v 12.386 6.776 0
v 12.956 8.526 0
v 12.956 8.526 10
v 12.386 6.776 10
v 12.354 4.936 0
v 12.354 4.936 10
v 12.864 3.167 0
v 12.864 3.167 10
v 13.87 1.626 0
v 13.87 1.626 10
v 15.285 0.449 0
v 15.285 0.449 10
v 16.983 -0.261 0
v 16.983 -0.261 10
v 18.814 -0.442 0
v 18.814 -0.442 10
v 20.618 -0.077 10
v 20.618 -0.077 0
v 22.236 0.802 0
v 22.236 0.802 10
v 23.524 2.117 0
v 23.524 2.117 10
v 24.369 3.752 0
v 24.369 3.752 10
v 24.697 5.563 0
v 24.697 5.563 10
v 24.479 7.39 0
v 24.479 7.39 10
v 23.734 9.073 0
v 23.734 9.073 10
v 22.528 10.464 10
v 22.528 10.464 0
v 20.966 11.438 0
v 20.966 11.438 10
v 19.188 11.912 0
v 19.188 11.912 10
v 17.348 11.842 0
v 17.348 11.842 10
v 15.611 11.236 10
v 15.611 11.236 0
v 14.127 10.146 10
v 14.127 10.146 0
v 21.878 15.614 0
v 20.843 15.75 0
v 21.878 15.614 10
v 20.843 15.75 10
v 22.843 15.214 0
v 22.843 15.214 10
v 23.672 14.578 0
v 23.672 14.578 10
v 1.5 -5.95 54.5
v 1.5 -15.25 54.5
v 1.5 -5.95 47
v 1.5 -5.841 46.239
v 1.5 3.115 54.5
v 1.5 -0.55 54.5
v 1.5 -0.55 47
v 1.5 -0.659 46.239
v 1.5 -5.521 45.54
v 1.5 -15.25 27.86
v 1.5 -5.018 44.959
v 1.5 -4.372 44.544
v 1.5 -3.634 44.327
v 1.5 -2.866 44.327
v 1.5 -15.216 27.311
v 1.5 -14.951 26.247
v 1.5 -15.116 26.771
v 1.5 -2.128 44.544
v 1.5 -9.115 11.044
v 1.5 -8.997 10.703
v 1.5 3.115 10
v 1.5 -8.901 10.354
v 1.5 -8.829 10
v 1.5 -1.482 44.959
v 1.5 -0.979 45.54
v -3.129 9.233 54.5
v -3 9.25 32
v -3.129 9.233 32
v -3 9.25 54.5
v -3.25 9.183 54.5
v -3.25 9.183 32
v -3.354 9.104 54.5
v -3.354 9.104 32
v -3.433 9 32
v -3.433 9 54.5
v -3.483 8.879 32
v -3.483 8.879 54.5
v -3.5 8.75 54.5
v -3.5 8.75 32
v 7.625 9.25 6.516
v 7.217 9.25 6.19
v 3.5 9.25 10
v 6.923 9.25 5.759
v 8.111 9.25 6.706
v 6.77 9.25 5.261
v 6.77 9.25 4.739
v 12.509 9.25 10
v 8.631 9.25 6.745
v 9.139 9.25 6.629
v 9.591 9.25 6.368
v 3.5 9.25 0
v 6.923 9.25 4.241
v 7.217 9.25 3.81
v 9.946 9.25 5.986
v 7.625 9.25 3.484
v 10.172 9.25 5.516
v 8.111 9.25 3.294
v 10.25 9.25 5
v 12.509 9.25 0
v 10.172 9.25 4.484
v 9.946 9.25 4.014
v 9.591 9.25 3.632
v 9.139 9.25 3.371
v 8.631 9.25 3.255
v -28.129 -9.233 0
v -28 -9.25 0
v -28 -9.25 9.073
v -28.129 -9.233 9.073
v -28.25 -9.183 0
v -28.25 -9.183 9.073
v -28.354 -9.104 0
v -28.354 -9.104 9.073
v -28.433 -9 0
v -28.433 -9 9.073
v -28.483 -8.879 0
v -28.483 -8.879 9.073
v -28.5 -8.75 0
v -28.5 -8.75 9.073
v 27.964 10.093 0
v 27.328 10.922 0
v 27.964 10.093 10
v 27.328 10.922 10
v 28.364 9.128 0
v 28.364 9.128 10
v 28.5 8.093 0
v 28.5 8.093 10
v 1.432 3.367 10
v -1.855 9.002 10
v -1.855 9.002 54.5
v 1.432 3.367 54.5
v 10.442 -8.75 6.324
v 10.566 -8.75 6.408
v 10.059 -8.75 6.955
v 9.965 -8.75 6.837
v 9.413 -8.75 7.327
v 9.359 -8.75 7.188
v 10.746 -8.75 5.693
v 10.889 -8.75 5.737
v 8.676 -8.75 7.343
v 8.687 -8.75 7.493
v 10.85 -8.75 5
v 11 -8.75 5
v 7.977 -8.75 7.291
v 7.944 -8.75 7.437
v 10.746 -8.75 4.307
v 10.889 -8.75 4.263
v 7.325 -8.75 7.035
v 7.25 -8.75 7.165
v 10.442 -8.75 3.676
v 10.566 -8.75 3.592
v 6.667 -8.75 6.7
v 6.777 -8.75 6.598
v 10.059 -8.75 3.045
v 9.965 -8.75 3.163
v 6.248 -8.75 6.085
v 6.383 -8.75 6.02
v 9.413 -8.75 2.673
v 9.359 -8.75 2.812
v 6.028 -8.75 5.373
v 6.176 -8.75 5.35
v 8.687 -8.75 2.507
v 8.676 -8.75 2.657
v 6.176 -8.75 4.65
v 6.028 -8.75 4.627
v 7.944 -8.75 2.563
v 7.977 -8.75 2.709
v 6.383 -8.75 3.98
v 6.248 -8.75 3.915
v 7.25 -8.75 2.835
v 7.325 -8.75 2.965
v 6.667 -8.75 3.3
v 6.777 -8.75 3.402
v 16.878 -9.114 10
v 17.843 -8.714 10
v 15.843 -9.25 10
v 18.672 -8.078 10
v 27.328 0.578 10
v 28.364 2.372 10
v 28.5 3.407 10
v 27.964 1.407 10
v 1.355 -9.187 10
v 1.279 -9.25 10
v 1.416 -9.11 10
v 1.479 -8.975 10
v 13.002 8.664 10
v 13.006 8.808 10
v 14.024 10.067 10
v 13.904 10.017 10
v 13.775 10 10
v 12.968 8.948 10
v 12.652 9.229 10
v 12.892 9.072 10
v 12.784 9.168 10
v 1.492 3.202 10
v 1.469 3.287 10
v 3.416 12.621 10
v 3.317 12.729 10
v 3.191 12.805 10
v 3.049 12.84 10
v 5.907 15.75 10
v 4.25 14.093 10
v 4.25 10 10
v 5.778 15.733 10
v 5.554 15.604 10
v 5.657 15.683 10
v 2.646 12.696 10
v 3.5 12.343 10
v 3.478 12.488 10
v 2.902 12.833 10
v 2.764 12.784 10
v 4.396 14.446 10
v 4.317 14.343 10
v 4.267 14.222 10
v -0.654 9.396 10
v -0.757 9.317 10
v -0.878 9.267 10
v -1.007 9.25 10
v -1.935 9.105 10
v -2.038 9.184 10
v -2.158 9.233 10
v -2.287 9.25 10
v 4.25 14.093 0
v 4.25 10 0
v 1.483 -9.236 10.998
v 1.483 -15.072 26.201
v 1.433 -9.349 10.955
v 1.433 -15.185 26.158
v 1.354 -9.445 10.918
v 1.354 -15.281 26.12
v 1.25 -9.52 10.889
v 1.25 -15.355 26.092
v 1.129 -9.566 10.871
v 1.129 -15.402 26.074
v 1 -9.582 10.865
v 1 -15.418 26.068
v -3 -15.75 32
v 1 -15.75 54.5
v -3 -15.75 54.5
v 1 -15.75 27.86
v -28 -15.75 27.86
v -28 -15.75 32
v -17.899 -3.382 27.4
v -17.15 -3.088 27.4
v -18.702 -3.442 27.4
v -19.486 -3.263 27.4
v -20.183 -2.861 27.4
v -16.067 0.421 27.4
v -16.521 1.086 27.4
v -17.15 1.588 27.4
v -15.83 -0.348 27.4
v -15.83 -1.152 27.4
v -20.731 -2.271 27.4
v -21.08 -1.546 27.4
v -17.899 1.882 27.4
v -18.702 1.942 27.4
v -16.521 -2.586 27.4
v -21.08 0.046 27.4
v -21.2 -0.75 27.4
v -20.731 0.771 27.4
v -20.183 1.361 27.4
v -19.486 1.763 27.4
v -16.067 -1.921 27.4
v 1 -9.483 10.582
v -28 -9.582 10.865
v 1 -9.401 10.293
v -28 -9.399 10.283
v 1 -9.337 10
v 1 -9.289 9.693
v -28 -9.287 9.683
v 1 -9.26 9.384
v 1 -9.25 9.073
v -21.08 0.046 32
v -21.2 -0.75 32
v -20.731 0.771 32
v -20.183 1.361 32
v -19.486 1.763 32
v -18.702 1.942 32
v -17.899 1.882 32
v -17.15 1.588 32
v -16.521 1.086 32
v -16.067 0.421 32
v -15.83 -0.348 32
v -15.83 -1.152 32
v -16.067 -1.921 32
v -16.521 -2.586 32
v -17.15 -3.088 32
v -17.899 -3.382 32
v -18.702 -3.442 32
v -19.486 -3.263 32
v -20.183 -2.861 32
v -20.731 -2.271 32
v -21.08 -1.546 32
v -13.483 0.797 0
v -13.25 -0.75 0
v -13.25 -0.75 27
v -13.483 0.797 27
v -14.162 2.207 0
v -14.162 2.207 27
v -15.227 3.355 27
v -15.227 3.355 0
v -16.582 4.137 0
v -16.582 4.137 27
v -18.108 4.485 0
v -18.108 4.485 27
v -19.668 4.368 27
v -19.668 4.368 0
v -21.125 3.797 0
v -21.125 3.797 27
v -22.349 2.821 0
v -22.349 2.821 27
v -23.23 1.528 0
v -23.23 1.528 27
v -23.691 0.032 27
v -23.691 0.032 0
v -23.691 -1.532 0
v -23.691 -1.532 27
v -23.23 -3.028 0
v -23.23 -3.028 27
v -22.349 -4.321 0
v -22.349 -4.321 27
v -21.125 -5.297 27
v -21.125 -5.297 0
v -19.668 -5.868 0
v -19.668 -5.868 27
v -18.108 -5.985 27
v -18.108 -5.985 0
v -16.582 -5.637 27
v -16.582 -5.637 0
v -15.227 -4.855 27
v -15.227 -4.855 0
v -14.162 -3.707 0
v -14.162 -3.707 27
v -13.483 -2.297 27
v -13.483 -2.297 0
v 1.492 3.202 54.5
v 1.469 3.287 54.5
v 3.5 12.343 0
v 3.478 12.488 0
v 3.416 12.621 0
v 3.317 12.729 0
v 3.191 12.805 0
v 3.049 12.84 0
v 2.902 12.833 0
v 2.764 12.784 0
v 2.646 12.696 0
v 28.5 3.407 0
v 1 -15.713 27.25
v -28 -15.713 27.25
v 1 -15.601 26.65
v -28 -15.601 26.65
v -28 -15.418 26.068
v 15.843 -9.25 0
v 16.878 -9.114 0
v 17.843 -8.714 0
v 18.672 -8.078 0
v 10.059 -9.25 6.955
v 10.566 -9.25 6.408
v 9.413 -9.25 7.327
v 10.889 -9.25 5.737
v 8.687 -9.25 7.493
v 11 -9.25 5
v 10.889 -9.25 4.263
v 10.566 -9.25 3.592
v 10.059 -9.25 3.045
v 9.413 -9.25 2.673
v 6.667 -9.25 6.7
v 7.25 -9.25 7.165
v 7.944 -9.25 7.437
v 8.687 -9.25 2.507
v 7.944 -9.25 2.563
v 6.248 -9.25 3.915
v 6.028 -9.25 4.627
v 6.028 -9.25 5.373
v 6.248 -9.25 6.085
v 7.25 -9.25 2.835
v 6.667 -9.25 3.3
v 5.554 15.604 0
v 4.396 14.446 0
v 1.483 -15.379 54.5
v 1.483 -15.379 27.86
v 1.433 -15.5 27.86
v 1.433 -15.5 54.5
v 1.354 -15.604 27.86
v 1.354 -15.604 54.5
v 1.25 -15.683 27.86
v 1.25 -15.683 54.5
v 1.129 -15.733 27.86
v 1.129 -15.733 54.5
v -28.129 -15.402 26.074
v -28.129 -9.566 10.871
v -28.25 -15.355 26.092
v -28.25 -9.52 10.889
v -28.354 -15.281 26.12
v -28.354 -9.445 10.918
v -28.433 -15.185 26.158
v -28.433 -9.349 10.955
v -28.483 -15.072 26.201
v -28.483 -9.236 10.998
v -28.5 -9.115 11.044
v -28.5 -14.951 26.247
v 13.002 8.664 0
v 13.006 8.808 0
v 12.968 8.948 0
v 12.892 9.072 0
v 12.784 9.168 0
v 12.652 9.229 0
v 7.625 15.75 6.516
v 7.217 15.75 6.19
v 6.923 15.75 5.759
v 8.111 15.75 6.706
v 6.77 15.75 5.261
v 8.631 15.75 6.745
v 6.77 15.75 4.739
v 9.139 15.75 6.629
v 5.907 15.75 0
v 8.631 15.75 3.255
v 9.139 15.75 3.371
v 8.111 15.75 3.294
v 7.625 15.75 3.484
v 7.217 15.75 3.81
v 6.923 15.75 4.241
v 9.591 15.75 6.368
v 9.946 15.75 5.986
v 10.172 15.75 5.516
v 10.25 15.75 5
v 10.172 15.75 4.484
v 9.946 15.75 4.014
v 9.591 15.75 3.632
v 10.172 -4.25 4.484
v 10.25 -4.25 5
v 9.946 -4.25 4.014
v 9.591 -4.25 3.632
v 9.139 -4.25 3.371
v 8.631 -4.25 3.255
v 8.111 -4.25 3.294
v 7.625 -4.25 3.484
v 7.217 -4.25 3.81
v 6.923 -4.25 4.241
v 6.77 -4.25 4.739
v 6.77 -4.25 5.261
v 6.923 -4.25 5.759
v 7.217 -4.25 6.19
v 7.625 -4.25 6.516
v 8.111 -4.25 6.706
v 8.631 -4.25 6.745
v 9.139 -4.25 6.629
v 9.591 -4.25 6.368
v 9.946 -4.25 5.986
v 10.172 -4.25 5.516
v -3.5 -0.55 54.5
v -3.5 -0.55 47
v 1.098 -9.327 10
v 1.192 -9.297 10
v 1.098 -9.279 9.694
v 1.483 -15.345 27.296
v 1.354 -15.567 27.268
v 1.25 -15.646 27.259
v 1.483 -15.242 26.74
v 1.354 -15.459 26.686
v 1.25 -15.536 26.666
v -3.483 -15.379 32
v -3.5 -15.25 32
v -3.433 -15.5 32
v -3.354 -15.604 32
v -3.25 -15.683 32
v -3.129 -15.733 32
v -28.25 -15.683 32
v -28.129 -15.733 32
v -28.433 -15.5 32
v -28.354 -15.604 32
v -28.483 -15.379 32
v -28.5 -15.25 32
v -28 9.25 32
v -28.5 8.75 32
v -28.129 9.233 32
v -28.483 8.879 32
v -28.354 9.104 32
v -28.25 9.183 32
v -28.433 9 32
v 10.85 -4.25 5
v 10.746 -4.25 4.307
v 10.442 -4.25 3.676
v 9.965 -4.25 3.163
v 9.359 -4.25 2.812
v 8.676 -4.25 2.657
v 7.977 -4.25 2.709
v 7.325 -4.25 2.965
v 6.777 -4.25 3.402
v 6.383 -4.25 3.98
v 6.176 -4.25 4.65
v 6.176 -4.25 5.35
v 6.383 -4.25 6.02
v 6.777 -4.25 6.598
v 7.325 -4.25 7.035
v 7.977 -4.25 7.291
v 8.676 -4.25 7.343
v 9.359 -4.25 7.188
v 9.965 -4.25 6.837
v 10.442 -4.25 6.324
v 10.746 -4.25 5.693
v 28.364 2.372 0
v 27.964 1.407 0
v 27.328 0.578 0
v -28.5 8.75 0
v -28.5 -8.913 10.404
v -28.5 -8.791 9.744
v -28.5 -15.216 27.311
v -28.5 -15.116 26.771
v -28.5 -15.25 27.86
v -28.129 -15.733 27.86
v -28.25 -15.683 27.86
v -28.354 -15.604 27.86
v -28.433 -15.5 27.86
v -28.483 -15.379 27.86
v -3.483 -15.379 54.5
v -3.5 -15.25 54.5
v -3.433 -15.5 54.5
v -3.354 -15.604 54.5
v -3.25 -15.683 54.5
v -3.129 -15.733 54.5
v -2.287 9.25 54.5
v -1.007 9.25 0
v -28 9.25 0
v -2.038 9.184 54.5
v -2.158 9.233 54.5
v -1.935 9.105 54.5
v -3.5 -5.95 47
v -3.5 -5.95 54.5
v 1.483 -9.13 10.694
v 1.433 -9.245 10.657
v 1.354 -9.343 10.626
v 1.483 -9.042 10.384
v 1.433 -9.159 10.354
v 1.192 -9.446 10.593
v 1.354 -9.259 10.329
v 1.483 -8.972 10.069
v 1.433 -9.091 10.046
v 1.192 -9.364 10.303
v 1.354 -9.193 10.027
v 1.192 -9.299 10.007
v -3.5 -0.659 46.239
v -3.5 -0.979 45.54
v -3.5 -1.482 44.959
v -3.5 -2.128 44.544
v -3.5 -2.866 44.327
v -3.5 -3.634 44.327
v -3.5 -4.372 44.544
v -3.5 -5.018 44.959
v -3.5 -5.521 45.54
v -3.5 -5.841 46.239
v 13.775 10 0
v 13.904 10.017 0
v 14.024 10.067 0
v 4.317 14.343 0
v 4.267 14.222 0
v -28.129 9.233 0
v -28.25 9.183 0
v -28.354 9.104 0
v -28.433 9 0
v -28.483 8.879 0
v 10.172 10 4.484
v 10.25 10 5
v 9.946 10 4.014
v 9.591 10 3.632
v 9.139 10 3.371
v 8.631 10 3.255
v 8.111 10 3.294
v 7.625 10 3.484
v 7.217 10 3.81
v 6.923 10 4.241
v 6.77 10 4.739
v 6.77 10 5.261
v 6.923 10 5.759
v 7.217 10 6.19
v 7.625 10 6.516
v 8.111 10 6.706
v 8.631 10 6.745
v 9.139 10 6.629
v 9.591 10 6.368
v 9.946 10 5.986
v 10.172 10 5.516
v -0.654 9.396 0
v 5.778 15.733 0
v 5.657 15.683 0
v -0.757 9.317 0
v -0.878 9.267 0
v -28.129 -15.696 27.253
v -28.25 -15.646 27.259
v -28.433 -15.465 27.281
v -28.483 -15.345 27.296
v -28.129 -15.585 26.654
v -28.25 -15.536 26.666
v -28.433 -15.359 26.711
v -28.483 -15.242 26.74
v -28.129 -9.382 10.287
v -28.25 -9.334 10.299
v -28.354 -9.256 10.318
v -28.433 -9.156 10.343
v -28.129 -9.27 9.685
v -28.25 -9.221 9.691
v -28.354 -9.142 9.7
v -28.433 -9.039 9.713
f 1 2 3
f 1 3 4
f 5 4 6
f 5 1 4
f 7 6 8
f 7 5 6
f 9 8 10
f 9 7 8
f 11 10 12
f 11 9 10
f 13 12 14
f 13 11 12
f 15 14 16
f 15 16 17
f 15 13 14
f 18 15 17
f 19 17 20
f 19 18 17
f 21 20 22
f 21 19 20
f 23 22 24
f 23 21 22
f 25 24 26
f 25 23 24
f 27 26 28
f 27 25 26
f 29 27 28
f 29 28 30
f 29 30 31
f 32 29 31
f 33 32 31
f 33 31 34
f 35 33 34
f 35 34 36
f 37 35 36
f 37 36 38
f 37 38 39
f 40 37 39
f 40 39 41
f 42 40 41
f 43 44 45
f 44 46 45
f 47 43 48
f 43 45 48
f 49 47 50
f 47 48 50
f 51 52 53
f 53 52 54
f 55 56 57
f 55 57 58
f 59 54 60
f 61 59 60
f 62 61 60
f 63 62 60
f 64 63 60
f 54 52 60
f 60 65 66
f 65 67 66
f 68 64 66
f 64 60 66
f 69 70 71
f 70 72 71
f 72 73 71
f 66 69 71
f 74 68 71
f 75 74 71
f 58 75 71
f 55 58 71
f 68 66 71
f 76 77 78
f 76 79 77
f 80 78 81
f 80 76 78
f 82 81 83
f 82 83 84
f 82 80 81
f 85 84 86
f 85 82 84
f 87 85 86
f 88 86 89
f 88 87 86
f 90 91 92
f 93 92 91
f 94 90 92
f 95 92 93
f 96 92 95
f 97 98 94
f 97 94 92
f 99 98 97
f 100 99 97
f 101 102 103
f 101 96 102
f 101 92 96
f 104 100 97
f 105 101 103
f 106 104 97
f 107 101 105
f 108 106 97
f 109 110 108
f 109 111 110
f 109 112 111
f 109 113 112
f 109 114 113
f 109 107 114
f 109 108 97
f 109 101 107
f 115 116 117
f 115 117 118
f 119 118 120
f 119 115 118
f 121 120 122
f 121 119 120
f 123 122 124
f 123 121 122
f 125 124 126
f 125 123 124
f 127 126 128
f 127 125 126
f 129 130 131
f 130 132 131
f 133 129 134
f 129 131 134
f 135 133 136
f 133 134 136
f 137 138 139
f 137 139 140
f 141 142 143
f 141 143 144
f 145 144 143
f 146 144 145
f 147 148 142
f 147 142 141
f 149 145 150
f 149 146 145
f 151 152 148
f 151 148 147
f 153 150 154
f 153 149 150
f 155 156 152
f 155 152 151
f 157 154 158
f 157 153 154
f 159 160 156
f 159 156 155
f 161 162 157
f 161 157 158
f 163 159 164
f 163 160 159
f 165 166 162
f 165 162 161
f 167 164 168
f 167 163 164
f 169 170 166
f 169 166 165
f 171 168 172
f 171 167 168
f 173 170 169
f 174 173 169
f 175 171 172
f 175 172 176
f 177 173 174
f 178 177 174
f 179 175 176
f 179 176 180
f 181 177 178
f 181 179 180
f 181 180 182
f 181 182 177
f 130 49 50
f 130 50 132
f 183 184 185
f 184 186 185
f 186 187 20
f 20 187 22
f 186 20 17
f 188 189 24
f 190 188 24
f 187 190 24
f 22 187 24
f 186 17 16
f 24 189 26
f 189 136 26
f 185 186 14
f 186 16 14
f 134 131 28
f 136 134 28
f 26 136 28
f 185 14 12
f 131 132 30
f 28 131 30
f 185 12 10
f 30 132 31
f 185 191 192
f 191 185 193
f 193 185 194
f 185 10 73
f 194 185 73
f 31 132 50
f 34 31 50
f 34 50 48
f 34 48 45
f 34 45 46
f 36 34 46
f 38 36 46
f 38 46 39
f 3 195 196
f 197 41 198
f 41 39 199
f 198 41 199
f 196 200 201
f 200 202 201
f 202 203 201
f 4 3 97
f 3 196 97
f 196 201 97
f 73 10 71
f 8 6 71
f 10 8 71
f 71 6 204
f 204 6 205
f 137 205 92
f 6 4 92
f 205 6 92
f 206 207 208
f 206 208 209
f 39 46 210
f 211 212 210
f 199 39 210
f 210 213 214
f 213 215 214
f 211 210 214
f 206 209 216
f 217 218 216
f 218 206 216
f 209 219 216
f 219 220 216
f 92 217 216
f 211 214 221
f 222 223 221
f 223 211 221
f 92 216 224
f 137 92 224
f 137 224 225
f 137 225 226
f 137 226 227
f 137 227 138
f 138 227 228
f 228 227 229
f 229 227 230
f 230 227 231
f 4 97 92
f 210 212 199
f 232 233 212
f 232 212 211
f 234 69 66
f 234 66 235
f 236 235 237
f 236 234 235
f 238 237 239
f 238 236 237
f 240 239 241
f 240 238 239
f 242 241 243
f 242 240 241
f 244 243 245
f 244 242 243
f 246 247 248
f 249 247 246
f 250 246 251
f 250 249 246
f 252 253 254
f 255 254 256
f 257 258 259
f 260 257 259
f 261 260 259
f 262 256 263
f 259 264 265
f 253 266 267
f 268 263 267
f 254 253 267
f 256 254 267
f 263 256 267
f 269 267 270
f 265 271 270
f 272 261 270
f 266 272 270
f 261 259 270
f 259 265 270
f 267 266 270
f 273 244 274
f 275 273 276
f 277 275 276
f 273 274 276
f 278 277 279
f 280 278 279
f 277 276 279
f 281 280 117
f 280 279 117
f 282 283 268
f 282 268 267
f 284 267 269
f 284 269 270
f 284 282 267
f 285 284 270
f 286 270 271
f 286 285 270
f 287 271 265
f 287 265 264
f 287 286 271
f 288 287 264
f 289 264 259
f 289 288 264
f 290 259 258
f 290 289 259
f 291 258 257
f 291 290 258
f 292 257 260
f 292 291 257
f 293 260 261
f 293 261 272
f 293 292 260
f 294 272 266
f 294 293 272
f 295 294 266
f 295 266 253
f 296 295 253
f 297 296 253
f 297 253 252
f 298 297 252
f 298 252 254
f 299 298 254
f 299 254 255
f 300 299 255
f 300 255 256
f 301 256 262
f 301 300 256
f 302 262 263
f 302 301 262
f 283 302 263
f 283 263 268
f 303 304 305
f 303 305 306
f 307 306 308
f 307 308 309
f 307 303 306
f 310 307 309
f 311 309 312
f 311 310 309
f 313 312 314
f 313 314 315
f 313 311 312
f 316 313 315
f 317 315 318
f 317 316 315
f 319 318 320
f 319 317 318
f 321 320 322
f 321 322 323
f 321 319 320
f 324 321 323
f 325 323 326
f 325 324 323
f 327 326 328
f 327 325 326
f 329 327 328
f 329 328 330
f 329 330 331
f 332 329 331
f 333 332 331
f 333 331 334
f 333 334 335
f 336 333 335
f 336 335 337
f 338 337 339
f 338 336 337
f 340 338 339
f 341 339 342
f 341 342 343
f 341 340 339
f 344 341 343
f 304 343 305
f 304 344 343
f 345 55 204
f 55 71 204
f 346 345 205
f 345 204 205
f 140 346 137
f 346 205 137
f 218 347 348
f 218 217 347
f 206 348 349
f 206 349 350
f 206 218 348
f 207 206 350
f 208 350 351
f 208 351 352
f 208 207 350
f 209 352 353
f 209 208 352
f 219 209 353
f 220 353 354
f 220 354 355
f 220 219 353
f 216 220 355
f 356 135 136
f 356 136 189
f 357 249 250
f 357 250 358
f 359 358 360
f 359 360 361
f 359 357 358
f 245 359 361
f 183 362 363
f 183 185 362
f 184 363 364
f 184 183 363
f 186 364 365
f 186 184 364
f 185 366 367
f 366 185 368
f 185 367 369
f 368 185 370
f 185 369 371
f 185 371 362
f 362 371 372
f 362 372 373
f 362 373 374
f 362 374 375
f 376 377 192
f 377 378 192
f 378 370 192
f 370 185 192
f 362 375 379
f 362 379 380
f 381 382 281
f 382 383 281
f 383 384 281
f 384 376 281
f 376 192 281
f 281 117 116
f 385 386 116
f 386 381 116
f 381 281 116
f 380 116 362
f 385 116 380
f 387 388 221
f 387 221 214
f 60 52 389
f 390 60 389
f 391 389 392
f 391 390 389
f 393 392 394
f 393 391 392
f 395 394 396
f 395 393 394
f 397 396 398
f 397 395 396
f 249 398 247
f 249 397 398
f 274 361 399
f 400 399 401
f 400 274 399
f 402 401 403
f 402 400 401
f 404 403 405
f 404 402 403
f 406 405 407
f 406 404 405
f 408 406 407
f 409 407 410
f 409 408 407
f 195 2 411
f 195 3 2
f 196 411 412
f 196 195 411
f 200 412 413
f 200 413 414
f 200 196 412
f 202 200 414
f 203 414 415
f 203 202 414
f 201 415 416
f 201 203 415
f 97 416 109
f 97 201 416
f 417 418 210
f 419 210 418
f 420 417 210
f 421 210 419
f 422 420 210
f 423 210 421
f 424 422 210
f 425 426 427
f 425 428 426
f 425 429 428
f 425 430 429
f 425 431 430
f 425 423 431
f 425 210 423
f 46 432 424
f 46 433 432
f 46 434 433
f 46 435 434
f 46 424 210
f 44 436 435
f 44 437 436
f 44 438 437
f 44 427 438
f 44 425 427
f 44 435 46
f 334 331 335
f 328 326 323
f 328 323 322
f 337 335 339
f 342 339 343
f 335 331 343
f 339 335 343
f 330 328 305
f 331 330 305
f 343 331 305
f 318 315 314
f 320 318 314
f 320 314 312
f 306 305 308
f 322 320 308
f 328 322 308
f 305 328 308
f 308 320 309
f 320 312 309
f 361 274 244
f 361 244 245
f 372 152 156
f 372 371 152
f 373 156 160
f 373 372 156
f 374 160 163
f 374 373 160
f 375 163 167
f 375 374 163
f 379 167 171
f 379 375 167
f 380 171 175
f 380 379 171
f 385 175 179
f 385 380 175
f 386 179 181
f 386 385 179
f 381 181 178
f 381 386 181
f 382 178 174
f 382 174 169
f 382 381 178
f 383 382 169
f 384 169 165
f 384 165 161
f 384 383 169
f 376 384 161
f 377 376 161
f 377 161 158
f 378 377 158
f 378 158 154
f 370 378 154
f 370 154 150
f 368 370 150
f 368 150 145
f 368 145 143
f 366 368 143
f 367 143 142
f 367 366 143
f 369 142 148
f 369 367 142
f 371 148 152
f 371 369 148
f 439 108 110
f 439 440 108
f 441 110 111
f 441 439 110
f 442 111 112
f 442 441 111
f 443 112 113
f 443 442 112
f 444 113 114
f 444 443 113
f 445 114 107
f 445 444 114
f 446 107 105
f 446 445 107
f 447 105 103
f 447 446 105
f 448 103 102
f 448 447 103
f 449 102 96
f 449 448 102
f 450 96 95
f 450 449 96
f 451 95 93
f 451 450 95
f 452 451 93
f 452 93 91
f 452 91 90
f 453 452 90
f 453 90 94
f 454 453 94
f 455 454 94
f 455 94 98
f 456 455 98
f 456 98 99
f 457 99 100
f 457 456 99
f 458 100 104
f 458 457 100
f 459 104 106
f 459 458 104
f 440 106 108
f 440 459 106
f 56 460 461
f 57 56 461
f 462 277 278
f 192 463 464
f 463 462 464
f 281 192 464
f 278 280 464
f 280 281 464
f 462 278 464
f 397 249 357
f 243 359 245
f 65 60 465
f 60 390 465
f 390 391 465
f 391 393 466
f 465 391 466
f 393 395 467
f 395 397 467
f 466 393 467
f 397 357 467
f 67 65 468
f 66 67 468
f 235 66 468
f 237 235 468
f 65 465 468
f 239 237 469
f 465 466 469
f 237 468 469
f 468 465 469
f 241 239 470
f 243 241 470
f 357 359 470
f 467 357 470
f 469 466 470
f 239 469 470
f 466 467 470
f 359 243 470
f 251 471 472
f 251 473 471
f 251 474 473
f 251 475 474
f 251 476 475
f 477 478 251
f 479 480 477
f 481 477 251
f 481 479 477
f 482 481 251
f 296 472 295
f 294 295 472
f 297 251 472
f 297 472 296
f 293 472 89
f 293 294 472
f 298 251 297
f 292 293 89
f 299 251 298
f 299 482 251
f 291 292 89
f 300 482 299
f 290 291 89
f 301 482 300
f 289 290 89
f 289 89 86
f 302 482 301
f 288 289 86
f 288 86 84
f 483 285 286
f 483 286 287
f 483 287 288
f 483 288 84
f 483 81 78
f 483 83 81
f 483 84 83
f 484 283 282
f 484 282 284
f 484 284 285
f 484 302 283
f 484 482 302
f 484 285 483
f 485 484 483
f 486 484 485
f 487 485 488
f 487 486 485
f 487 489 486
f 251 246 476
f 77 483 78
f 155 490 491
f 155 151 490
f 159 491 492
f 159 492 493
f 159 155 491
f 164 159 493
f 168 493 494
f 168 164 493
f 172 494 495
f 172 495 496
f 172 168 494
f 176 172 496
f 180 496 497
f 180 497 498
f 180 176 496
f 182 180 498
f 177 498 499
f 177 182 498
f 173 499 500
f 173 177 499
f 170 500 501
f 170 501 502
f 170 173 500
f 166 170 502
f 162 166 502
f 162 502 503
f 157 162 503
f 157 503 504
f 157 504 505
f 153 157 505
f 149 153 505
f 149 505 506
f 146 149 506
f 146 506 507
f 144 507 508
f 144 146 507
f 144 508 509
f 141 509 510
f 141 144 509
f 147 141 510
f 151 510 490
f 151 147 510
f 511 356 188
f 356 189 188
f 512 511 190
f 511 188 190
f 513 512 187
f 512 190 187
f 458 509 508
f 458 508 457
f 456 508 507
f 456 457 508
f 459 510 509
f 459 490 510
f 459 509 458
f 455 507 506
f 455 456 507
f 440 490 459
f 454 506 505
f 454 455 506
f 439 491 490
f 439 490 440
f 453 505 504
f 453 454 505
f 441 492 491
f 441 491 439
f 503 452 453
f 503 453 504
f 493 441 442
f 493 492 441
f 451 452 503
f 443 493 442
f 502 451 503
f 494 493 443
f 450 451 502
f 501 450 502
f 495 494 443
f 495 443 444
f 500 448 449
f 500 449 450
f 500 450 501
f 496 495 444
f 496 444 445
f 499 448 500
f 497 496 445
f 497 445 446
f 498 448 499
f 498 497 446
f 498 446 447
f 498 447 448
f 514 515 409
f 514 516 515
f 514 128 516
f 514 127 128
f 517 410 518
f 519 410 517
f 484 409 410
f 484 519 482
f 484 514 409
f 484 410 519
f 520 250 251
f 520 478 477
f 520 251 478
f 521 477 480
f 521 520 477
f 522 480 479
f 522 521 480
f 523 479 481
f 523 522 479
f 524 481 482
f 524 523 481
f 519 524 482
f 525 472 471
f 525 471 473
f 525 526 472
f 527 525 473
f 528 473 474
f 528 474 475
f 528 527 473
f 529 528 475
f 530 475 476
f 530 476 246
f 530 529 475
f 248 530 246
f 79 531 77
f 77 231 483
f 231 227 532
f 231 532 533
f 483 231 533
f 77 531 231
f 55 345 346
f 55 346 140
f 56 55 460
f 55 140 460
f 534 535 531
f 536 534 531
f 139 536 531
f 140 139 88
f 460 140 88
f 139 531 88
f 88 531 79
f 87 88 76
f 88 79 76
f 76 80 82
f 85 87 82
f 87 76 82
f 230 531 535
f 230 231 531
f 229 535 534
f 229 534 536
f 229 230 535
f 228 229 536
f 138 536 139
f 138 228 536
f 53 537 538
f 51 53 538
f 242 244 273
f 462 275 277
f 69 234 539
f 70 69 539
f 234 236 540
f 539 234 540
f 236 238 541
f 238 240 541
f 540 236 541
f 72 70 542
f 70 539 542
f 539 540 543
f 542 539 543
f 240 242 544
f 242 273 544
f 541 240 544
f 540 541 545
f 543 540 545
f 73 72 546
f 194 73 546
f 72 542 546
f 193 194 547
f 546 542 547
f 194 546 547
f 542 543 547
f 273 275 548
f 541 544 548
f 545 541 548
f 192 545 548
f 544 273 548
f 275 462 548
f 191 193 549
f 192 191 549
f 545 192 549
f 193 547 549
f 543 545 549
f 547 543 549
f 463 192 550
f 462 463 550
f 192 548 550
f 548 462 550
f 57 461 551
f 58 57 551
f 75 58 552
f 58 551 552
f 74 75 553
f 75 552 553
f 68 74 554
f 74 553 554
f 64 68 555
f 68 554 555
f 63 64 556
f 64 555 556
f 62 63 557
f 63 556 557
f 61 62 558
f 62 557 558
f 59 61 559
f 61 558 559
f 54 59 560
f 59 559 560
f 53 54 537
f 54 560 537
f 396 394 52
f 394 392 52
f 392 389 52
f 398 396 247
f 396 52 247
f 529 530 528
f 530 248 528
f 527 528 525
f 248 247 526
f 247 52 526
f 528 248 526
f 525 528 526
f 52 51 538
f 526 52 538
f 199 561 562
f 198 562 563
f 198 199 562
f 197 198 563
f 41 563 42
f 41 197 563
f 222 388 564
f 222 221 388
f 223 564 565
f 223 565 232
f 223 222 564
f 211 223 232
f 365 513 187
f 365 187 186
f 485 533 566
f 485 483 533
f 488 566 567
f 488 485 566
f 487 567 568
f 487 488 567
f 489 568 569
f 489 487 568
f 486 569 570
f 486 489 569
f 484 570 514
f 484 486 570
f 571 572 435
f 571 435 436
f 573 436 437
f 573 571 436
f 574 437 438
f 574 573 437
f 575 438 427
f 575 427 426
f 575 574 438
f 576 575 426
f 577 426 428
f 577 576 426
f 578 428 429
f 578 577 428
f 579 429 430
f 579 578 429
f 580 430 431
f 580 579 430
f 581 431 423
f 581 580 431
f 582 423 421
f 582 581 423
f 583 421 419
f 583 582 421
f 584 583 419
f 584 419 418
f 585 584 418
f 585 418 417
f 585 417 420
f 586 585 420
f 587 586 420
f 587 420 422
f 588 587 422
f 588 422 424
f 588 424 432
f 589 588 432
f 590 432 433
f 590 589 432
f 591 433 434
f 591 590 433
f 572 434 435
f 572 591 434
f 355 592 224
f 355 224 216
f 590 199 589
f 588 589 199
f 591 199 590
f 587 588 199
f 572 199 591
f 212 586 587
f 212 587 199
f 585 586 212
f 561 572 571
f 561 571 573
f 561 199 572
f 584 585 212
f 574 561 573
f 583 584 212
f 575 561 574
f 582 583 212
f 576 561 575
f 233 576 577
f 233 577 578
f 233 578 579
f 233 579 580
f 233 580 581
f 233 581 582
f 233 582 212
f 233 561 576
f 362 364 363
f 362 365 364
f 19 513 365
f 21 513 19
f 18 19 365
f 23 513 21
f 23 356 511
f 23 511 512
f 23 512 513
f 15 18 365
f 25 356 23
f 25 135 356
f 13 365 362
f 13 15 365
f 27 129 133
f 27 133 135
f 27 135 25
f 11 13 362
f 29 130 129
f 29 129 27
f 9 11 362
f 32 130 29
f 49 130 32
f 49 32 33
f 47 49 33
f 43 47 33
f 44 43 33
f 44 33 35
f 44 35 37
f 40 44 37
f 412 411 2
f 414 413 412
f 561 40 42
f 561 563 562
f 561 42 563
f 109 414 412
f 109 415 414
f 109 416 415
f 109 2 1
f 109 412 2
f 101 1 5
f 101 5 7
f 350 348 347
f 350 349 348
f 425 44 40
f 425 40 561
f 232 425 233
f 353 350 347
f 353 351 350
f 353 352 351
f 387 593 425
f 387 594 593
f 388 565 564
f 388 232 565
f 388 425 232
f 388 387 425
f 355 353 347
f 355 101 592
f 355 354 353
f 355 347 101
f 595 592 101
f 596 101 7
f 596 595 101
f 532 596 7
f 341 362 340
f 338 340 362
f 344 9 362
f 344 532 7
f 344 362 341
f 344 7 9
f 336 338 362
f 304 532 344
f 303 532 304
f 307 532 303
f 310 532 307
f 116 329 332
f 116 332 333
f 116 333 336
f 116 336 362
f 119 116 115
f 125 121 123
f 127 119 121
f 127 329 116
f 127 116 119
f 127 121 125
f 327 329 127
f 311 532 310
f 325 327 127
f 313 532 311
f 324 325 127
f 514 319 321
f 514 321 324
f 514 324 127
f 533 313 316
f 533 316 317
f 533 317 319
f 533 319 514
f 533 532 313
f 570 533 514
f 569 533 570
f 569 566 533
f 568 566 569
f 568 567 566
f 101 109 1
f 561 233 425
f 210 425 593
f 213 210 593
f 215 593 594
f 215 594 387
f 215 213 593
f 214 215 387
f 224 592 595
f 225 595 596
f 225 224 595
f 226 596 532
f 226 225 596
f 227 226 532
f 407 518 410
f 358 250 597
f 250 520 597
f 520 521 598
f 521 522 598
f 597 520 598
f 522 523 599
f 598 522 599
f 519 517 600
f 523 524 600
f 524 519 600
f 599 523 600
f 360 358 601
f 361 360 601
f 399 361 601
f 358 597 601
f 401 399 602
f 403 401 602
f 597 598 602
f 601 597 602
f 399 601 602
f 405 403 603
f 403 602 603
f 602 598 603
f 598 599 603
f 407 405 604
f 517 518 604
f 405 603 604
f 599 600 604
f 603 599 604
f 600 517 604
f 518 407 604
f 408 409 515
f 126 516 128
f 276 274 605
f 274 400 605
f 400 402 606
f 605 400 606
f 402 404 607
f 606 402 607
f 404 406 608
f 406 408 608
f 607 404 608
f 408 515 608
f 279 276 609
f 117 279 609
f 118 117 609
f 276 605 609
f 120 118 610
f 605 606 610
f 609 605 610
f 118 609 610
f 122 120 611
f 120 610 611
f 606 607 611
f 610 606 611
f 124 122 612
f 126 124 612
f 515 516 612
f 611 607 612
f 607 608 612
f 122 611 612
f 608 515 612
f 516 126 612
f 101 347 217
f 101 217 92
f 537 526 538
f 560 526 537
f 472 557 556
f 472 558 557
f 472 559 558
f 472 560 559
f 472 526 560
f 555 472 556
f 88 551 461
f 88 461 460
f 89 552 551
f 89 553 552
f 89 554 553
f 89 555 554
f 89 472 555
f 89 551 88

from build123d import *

# Parameters (mm, degrees)
BOSS_EXTRUDE1_DEPTH = 10
BOSS_EXTRUDE2_DEPTH = 30
SKETCH3_W           = 5
SKETCH3_H           = 25
BOSS_EXTRUDE3_DEPTH = 22.5
SKETCH4_R           = 5.25
CUT_EXTRUDE1_DEPTH  = 27
SKETCH5_R           = 2.7
CUT_EXTRUDE3_DEPTH  = 4.6
CUT_EXTRUDE4_DEPTH  = 44.5
CUT_EXTRUDE5_REACH  = 67.133
FILLET1_R           = 4
FILLET2_R           = 0.5
FILLET3_R           = 5
FILLET4_R           = 0.5


with BuildPart() as part:
    # Sketch1 → Boss-Extrude1 (new body)
    with BuildSketch(Plane.XY):
        with BuildLine():
            Line((-22.5, 15.75), (-28.5, 9.75))
            Line((-28.5, 9.75), (-28.5, 9.25))
            Line((-28.5, 9.25), (-28.5, 1.75))
            Line((-28.5, 1.75), (-17.5, -9.25))
            Line((-17.5, -9.25), (28.5, -9.25))
            Line((28.5, -9.25), (28.5, 9.25))
            Line((28.5, 9.25), (0.8, 9.25))
            Line((0.8, 9.25), (-3.5, 13.55))
            Line((-3.5, 13.55), (-3.5, 9.25))
            Line((-3.5, 9.25), (-13.382383367, 9.25))
            ThreePointArc((-13.382383367, 9.25), (-23.330458604, 1.863270054), (-13.985855563, 10))
            Line((-13.985855563, 10), (-4.25, 10))
            Line((-4.25, 10), (-4.25, 14.3))
            Line((-4.25, 14.3), (-5.7, 15.75))
            Line((-5.7, 15.75), (-22.5, 15.75))
        make_face()
    extrude(amount=BOSS_EXTRUDE1_DEPTH)

    # Sketch2 → Boss-Extrude2 (add)
    with BuildSketch(Plane(origin=(28.5, 0, 0), x_dir=(0, 0, -1), z_dir=(1, 0, 0))):
        Polygon((-10, 9.25), (-10, -9.25), (-26.933078921, -15.75), (-32, -15.75), (-32, 9.25), align=None)
    extrude(amount=-BOSS_EXTRUDE2_DEPTH)

    # Sketch3 → Boss-Extrude3 (add)
    with BuildSketch(Plane.XY.offset(32)):
        with Locations((1, -3.25)):
            Rectangle(SKETCH3_W, SKETCH3_H)
    extrude(amount=BOSS_EXTRUDE3_DEPTH)

    # Sketch4 → Cut-Extrude1 (cut)
    with BuildSketch(Plane(origin=(0, 0, 0), x_dir=(-1, 0, 0), z_dir=(0, 0, -1))):
        with Locations((-18.5, -0.75)):
            Circle(SKETCH4_R)
    extrude(amount=-CUT_EXTRUDE1_DEPTH, mode=Mode.SUBTRACT)

    # Sketch5 → Cut-Extrude3 (cut)
    with BuildSketch(Plane.XY.offset(32)):
        with Locations((18.5, -0.75)):
            Circle(SKETCH5_R)
    extrude(amount=-CUT_EXTRUDE3_DEPTH, mode=Mode.SUBTRACT)

    # Sketch6 → Cut-Extrude4 (cut)
    with BuildSketch(Plane.XY.offset(54.5)):
        Polygon((-1.5, 9.25), (2, 9.25), (-1.5, 3.25), align=None)
    extrude(amount=-CUT_EXTRUDE4_DEPTH, mode=Mode.SUBTRACT)

    # Sketch7 → Cut-Extrude5 (cut, up to next)
    with BuildSketch(Plane(origin=(3.5, 0, 0), x_dir=(0, 0, -1), z_dir=(1, 0, 0)), mode=Mode.PRIVATE) as cut_extrude5_sk1:
        with BuildLine():
            Line((-47, -5.95), (-54.5, -5.95))
            Line((-54.5, -5.95), (-54.5, -0.55))
            Line((-54.5, -0.55), (-47, -0.55))
            ThreePointArc((-47, -0.55), (-44.3, -3.25), (-47, -5.95))
        make_face()
    cut_extrude5_tool1 = extrude(cut_extrude5_sk1.sketch, amount=-CUT_EXTRUDE5_REACH, mode=Mode.PRIVATE) & part.part
    add(cut_extrude5_tool1.solids().sort_by_distance((3.5, -3.25, 49.670838))[0], mode=Mode.SUBTRACT)

    # Fillet1
    fillet1_edges = [part.edges().sort_by_distance(p)[0] for p in [
        (-17.5, -9.25, 5),
        (-28.5, 1.75, 5),
        (-28.5, 9.75, 5),
        (-22.5, 15.75, 5),
    ]]
    fillet(fillet1_edges, radius=FILLET1_R)

    # Fillet2
    fillet2_edges = [part.edges().sort_by_distance(p)[0] for p in [
        (3.5, -15.75, 43.25),
        (3.5, 9.25, 43.25),
        (-1.5, 3.25, 32.25),
        (2, 9.25, 32.25),
        (-13.985855563, 10, 5),
        (-13.382383367, 9.25, 5),
        (-3.5, 13.55, 5),
        (-4.25, 14.3, 5),
        (28.5, 9.25, 16),
        (0.8, 9.25, 5),
        (-5.7, 15.75, 5),
    ]]
    fillet(fillet2_edges, radius=FILLET2_R)

    # Fillet3
    fillet3_edges = [part.edges().sort_by_distance(p)[0] for p in [
        (13.5, -9.25, 10),
        (13.5, -15.75, 26.933078921),
    ]]
    fillet(fillet3_edges, radius=FILLET3_R)

    # Fillet4
    # the kernel refuses this fillet: 0.5 mm, written as the material it takes off along each edge
    with BuildSketch(Plane(origin=(28.5, -15.75, 27.859774145), x_dir=(-1, 0, 0), z_dir=(0, 0, 1))) as fillet4_piece_1:
        with BuildLine():
            CenterArc((FILLET4_R, -FILLET4_R), FILLET4_R, 90, 90)
            Line((0, -FILLET4_R), (0, 0))
            Line((0, 0), (FILLET4_R, 0))
        make_face()
    extrude(amount=5.390225855, mode=Mode.SUBTRACT)
    with BuildSketch(Plane(origin=(28.5, -10.75, 27.859774145), x_dir=(0, -1, 0), z_dir=(0, 0, 1))) as fillet4_piece_2:
        with BuildLine():
            CenterArc((5 - FILLET4_R, -FILLET4_R), FILLET4_R, 0, 90)
            Line((5, -FILLET4_R), (5, 0))
            Line((5, 0), (5 - FILLET4_R, 0))
        make_face()
    revolve(axis=Axis((28.5, -10.75, 27.859774145), (1, 0, 0)), revolution_arc=21, mode=Mode.SUBTRACT)
    with BuildSketch(Plane(origin=(28.5, -9.25, -1.25), x_dir=(0, 1, 0), z_dir=(0, 0, 1))) as fillet4_piece_3:
        with BuildLine():
            CenterArc((FILLET4_R, FILLET4_R), FILLET4_R, 180, 90)
            Line((0, FILLET4_R), (0, 0))
            Line((0, 0), (FILLET4_R, 0))
        make_face()
    extrude(amount=10.323304775, mode=Mode.SUBTRACT)
    with BuildSketch(Plane(origin=(28.5, -14.25, 9.073304775), x_dir=(0, 0.9335804264972017, 0.35836794954530055), z_dir=(0, -0.35836794954530055, 0.9335804264972017))) as fillet4_piece_4:
        with BuildLine():
            CenterArc((5 + FILLET4_R, FILLET4_R), FILLET4_R, 180, 90)
            Line((5, FILLET4_R), (5, 0))
            Line((5, 0), (5 + FILLET4_R, 0))
        make_face()
    revolve(axis=Axis((28.5, -14.25, 9.073304775), (-1, 0, 0)), revolution_arc=21, mode=Mode.SUBTRACT)
    with BuildSketch(Plane(origin=(-1.5, -14.25, 9.073304775), x_dir=(0, 0.9335804264972017, 0.35836794954530055), z_dir=(0, -0.35836794954530055, 0.9335804264972017))) as fillet4_piece_5_section:
        with BuildLine():
            CenterArc((5 + FILLET4_R, -FILLET4_R), FILLET4_R, 90, 90)
            Line((5, -FILLET4_R), (5, 0))
            Line((5, 0), (5 + FILLET4_R, 0))
        make_face()
    fillet4_piece_5 = revolve(axis=Axis((-1.5, -14.25, 9.073304775), (-1, 0, 0)), revolution_arc=35.324258071, mode=Mode.PRIVATE)
    fillet4_piece_5 = split(fillet4_piece_5, bisect_by=Plane(origin=(-1.457320012, -9.164080053, 10), z_dir=(0, 0, 1)), keep=Keep.TOP, mode=Mode.PRIVATE)
    add(fillet4_piece_5, mode=Mode.SUBTRACT)
    with BuildSketch(Plane(origin=(-1.5, -14.25, 9.073304775), x_dir=(0, 0.9335804264972017, 0.35836794954530055), z_dir=(0, -0.35836794954530055, 0.9335804264972017))) as fillet4_piece_6_section:
        with BuildLine():
            CenterArc((5 + FILLET4_R, -FILLET4_R), FILLET4_R, 90, 90)
            Line((5, -FILLET4_R), (5, 0))
            Line((5, 0), (5 + FILLET4_R, 0))
        make_face()
    fillet4_piece_6 = revolve(axis=Axis((-1.5, -14.25, 9.073304775), (-1, 0, 0)), revolution_arc=35.324258071, mode=Mode.PRIVATE)
    fillet4_piece_6 = split(fillet4_piece_6, bisect_by=Plane(origin=(-1.316288707, -9.25, 9.750524402), z_dir=(0, -1, 0)), keep=Keep.TOP, mode=Mode.PRIVATE)
    add(fillet4_piece_6, mode=Mode.SUBTRACT)
    with BuildSketch(Plane(origin=(-1.5, -9.582097868, 10.865144523), x_dir=(0, 0.9335804264972015, 0.3583679495453009), z_dir=(0, -0.3583679495453009, 0.9335804264972015))) as fillet4_piece_7:
        with BuildLine():
            CenterArc((FILLET4_R, -FILLET4_R), FILLET4_R, 90, 90)
            Line((0, -FILLET4_R), (0, 0))
            Line((0, 0), (FILLET4_R, 0))
        make_face()
    extrude(amount=16.284392263, mode=Mode.SUBTRACT)
    with BuildSketch(Plane(origin=(28.5, -9.582097868, 10.865144523), x_dir=(0, 0.9335804264972015, 0.3583679495453009), z_dir=(0, -0.3583679495453009, 0.9335804264972015))) as fillet4_piece_8:
        with BuildLine():
            CenterArc((FILLET4_R, FILLET4_R), FILLET4_R, 180, 90)
            Line((0, FILLET4_R), (0, 0))
            Line((0, 0), (FILLET4_R, 0))
        make_face()
    extrude(amount=16.284392263, mode=Mode.SUBTRACT)
    with BuildSketch(Plane(origin=(-1.5, -10.75, 27.859774145), x_dir=(0, -1, 0), z_dir=(0, 0, 1))) as fillet4_piece_9:
        with BuildLine():
            CenterArc((5 - FILLET4_R, FILLET4_R), FILLET4_R, 270, 90)
            Line((5 - FILLET4_R, 0), (5, 0))
            Line((5, 0), (5, FILLET4_R))
        make_face()
    revolve(axis=Axis((-1.5, -10.75, 27.859774145), (1, 0, 0)), revolution_arc=21, mode=Mode.SUBTRACT)
    with BuildSketch(Plane(origin=(-1.5, -15.75, 27.859774145), x_dir=(1, 0, 0), z_dir=(0, 0, 1))) as fillet4_piece_10:
        with BuildLine():
            CenterArc((FILLET4_R, FILLET4_R), FILLET4_R, 180, 90)
            Line((0, FILLET4_R), (0, 0))
            Line((0, 0), (FILLET4_R, 0))
        make_face()
    extrude(amount=27.890225855, mode=Mode.SUBTRACT)

    # Sketch8 → Cut-Revolve1 (revolve, cut)
    with BuildSketch(Plane.XY.offset(5), mode=Mode.PRIVATE) as cut_revolve1_sk:
        Polygon((-8.5, 15.75), (-6.75, 15.75), (-6.75, -4.25), (-6.15, -4.25), (-6.15, -8.75), (-6, -8.75), (-6, -9.25), (-8.5, -9.25), align=None)
    revolve(cut_revolve1_sk.sketch.rotate(Axis((-8.5, 24.852937644, 5), (0, -1, 0)), 180), axis=Axis((-8.5, 24.852937644, 5), (0, -1, 0)), mode=Mode.SUBTRACT)


with BuildPart() as body_2:
    # Mirror1: mirrored copy
    add(part.part.mirror(Plane(origin=(0, 0, 0), x_dir=(0, 0, 1), z_dir=(1, 0, 0))))


solid = body_2.part
